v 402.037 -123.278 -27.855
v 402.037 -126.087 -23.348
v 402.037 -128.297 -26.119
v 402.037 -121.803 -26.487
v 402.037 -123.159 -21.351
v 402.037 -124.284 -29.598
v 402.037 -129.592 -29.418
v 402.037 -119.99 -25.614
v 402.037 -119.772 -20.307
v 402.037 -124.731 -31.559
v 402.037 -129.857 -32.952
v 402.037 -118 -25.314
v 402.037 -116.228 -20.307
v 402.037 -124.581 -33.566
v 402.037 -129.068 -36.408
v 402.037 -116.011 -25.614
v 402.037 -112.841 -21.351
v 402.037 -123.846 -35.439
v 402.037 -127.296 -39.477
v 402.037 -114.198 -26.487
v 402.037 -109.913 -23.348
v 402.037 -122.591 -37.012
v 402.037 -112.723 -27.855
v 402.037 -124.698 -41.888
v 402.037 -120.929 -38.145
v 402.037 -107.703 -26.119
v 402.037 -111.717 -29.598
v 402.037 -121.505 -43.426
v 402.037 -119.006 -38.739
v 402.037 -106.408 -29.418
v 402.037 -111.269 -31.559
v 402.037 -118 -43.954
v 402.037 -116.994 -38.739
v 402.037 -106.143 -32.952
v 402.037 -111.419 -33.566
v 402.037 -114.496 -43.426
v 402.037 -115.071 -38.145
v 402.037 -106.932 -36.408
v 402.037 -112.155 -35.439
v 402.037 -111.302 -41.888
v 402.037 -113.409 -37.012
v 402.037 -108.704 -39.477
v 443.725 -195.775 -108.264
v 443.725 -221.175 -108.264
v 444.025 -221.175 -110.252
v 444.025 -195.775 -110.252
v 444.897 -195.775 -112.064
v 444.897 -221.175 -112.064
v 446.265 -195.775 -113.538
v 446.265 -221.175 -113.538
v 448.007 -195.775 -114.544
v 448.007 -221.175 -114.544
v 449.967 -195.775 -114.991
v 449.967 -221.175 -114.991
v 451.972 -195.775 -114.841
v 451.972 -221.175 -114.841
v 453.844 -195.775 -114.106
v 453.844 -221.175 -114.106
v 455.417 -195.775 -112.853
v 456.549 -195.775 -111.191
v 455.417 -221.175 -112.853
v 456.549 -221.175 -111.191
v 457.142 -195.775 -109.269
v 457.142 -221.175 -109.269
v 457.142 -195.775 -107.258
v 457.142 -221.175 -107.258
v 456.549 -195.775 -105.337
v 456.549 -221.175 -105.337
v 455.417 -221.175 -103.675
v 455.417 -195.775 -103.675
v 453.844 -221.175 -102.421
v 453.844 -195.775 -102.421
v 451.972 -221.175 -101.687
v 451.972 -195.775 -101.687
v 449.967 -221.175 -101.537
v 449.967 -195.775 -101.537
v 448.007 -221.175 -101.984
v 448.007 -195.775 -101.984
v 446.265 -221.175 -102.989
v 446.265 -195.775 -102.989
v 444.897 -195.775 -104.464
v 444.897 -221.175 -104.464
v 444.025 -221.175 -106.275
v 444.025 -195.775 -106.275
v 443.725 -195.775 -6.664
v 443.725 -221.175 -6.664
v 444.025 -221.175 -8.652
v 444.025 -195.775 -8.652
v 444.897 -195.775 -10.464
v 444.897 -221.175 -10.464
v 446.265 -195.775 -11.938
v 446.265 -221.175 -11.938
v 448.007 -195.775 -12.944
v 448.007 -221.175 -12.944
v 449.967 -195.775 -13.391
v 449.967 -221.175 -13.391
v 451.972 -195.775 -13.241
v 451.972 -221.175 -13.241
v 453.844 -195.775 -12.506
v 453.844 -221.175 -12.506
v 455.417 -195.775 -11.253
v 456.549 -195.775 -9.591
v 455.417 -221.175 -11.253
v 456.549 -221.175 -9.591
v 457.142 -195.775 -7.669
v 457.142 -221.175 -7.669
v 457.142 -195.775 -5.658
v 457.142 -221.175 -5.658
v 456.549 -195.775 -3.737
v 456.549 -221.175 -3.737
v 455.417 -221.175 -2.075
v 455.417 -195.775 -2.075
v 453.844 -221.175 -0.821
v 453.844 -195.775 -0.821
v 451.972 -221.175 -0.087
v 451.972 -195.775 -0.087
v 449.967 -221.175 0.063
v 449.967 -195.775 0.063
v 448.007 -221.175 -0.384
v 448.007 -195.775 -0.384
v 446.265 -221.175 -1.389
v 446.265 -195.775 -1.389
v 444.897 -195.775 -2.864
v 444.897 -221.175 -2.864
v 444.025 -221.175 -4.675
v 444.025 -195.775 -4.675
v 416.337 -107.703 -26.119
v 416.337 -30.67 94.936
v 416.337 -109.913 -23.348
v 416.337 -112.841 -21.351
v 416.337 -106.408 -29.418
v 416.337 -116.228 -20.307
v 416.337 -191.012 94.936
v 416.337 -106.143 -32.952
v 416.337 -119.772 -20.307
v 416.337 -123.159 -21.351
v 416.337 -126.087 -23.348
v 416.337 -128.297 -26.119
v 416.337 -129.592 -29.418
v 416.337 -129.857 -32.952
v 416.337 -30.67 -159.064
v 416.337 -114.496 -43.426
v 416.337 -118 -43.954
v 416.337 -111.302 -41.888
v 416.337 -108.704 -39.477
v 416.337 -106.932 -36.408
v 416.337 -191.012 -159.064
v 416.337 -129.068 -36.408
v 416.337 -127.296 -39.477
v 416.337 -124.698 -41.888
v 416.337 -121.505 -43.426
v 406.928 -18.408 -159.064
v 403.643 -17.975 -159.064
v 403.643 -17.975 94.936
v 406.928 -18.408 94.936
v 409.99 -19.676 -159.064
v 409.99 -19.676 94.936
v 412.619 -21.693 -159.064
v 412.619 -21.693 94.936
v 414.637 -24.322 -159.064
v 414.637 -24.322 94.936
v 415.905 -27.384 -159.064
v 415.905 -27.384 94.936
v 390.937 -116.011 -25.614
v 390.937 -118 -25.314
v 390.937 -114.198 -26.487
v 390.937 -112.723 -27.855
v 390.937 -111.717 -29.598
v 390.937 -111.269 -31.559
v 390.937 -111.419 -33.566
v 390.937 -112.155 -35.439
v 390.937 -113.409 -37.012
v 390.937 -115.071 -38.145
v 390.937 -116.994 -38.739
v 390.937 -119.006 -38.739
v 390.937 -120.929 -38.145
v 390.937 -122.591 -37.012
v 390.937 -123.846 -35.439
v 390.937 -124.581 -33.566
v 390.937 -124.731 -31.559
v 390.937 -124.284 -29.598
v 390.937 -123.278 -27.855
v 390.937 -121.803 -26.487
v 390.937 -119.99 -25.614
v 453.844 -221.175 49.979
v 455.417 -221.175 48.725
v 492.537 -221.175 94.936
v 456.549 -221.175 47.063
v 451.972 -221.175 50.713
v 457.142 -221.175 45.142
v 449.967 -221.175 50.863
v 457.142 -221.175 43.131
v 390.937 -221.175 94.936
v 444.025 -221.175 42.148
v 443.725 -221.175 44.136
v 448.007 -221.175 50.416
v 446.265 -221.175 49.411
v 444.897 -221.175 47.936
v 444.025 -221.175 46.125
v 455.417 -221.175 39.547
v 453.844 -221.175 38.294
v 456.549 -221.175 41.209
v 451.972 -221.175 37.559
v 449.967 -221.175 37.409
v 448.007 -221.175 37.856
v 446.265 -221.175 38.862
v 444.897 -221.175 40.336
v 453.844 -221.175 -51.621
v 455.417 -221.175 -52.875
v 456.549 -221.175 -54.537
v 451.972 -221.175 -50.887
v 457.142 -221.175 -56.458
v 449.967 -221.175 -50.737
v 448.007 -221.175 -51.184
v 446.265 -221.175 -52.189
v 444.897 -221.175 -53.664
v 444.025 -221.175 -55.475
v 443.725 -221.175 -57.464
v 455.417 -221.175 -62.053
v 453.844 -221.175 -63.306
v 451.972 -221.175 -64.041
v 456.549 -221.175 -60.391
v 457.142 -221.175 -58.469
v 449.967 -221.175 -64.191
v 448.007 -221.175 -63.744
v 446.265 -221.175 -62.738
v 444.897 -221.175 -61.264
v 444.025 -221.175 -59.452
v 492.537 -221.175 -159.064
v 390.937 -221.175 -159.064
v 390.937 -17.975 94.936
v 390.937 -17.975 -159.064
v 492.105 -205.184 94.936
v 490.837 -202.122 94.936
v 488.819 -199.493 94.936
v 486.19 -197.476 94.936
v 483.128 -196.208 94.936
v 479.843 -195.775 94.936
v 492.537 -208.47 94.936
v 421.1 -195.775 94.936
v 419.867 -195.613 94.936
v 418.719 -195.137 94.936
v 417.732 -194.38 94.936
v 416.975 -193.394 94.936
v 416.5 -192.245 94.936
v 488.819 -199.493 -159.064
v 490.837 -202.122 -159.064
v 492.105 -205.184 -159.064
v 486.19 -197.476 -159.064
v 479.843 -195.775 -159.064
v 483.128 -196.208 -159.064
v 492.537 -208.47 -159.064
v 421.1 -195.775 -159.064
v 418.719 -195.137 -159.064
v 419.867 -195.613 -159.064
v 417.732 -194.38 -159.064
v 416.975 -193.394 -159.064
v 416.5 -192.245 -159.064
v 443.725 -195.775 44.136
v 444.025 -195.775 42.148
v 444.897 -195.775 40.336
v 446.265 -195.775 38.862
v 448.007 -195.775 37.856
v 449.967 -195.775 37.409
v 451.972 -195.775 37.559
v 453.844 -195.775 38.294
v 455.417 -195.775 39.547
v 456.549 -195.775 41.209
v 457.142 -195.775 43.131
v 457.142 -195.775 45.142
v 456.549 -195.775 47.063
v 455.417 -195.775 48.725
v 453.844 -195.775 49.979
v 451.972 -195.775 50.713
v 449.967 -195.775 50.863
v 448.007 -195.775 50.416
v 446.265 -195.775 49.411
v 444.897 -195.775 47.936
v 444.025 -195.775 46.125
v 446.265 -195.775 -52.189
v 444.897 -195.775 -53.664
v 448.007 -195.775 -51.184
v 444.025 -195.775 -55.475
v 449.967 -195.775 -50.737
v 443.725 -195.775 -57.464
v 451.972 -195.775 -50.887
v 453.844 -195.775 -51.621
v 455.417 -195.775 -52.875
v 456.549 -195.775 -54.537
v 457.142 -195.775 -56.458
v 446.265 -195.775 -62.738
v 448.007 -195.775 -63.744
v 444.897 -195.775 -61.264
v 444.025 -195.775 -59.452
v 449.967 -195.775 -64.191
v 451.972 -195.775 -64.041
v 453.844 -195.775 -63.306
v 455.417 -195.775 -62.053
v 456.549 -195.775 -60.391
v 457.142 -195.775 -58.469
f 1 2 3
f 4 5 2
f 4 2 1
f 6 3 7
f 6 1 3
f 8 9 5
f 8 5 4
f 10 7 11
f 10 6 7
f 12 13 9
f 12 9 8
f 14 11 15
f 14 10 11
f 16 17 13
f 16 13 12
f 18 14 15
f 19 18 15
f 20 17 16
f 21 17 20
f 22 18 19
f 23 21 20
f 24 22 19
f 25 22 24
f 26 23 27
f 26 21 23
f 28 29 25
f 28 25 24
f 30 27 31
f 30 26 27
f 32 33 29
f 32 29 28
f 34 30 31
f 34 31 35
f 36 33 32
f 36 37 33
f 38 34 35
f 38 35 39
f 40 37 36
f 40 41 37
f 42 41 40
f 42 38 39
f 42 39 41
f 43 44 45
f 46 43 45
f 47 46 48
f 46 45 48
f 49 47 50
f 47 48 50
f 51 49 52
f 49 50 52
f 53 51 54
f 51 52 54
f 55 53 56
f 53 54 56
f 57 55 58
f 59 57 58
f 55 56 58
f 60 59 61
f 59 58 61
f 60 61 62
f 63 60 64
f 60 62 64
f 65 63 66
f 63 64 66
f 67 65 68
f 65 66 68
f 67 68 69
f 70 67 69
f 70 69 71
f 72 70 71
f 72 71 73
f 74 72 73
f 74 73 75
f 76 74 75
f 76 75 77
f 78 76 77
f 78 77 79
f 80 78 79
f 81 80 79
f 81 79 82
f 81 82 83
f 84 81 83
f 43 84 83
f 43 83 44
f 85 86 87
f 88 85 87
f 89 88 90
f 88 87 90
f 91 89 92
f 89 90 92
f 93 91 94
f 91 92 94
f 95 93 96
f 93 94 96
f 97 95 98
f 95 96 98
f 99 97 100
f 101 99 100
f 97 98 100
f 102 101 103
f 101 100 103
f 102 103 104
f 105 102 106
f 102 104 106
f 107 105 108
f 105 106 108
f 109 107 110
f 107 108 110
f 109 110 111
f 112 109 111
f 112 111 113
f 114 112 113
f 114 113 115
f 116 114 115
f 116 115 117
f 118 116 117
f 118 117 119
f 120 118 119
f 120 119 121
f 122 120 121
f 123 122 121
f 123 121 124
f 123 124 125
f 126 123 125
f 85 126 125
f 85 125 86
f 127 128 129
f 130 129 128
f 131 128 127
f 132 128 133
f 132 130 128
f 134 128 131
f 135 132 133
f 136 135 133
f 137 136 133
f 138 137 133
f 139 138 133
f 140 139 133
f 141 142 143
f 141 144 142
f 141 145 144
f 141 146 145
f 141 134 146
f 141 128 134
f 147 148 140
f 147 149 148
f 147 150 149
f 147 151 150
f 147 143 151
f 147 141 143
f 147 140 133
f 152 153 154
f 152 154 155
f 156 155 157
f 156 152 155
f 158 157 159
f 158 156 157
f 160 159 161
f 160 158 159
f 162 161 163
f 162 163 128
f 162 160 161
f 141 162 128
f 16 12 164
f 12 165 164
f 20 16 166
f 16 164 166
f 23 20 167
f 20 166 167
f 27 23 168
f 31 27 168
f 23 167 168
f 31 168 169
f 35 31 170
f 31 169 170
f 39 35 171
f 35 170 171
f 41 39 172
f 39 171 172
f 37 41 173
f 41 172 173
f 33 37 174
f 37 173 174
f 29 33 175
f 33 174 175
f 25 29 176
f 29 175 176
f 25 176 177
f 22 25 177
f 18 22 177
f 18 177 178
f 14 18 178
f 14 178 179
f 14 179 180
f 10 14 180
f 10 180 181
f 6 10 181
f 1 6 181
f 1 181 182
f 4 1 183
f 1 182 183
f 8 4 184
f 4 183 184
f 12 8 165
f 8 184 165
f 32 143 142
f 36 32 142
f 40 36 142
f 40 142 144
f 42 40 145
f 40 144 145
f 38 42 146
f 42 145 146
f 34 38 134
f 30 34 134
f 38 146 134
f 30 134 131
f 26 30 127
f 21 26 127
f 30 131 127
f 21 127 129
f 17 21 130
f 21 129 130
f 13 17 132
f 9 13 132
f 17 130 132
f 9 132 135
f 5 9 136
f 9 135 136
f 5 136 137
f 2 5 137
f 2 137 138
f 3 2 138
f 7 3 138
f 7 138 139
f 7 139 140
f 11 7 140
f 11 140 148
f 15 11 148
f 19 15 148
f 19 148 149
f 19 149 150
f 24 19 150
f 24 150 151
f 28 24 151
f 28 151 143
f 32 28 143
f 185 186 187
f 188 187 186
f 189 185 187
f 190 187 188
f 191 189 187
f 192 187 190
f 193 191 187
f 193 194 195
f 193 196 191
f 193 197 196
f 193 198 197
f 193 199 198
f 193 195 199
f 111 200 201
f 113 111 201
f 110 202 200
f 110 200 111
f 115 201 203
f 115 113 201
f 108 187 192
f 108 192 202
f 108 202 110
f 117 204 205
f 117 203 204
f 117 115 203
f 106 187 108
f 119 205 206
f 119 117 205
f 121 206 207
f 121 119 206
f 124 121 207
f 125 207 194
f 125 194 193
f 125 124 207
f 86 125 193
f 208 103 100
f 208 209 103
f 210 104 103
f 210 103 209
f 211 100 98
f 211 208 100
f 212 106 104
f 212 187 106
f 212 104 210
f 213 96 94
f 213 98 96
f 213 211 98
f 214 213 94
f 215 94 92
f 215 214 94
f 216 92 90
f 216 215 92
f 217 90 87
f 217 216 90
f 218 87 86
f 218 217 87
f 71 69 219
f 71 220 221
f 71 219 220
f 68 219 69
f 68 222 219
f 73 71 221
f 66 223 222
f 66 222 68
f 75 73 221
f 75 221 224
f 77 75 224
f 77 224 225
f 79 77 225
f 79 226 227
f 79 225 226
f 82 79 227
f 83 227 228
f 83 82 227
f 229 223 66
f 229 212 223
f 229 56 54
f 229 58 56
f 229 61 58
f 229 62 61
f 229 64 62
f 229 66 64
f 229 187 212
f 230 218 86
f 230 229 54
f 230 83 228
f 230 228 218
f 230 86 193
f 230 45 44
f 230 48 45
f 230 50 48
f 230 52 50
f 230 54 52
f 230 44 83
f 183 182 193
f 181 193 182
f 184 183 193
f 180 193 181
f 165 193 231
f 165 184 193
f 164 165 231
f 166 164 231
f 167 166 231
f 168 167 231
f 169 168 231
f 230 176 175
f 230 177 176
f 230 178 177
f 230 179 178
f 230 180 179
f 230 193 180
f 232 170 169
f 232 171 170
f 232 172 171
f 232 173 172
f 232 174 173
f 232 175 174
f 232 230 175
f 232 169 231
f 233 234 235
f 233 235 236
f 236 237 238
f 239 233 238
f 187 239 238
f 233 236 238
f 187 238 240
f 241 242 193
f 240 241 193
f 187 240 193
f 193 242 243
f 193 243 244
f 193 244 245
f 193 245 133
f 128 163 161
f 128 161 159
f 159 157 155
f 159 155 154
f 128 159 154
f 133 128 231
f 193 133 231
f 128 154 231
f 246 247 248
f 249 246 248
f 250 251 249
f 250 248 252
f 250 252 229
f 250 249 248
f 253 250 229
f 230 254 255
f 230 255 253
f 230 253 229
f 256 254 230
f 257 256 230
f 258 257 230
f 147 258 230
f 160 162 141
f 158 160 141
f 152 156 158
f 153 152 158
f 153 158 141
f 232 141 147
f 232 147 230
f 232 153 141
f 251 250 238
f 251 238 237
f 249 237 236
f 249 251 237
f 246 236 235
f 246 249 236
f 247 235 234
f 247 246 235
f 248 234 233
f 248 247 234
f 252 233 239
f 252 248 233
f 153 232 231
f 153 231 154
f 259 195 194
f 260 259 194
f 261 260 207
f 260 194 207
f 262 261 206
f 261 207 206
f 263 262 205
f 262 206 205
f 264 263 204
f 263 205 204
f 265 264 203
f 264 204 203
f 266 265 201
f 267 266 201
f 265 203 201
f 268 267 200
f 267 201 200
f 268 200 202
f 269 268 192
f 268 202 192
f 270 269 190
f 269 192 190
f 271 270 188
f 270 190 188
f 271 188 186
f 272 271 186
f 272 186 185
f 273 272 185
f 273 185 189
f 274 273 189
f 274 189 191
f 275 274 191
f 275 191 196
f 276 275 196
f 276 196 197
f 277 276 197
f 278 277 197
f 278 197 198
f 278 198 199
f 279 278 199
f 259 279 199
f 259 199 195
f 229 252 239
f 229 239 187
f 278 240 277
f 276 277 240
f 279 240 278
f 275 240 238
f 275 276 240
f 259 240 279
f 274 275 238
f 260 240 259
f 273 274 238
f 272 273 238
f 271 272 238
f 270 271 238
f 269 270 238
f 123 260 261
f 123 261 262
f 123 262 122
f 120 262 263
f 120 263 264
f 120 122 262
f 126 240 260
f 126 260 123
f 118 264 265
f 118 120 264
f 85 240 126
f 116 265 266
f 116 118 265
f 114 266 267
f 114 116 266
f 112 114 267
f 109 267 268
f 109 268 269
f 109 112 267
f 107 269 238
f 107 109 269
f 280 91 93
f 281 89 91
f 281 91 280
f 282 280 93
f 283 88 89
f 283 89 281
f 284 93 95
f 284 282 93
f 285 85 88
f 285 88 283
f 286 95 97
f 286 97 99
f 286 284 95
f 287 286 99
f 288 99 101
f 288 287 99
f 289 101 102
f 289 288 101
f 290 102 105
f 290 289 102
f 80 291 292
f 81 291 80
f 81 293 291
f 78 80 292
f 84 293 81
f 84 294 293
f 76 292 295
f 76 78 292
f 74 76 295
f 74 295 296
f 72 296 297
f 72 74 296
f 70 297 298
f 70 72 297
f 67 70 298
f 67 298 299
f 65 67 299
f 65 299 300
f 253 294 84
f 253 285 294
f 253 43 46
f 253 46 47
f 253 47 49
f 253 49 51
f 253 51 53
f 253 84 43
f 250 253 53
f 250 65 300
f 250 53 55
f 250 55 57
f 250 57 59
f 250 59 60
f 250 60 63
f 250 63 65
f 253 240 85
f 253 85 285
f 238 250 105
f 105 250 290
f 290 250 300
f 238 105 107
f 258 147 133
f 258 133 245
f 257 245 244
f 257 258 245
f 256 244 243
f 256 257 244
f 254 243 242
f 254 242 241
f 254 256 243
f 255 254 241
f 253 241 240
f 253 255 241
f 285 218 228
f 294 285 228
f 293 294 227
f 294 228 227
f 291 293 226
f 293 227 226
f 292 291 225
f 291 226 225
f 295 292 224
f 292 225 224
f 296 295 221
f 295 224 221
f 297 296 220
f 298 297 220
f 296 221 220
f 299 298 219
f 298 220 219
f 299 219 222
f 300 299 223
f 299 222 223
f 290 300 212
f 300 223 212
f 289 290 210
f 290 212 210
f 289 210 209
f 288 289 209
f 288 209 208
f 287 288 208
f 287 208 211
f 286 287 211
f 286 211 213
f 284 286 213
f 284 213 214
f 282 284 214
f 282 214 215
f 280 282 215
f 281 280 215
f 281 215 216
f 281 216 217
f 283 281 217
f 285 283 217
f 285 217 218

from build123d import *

# Parameters (mm, degrees)
L_ANGLE_L8X4X1_1_DEPTH                   = 254
F_1_2_CLEARANCE_HOLE1_D                  = 13.49248
CBORE_FOR_M12_HEX_HEAD_BOLT1_D           = 13.5
CBORE_FOR_M12_HEX_HEAD_BOLT1_CBORE_D     = 23.78
CBORE_FOR_M12_HEX_HEAD_BOLT1_CBORE_DEPTH = 14.3


with BuildPart() as part:
    # Sketch114 → L angle L8X4X1(1) (new body)
    with BuildSketch(Plane(origin=(390.937425431, -221.174980879, -159.063896304), x_dir=(1, 0, 0), z_dir=(0, 0, 1))):
        with BuildLine():
            Line((0, 0), (0, 203.2))
            Line((0, 203.2), (12.70508, 203.2))
            ThreePointArc((12.70508, 203.2), (21.681744019, 199.481744019), (25.4, 190.50508))
            Line((25.4, 190.50508), (25.4, 30.1625))
            ThreePointArc((25.4, 30.1625), (26.794903955, 26.794903955), (30.1625, 25.4))
            Line((30.1625, 25.4), (88.90508, 25.4))
            ThreePointArc((88.90508, 25.4), (97.881744019, 21.681744019), (101.6, 12.70508))
            Line((101.6, 12.70508), (101.6, 0))
            Line((101.6, 0), (0, 0))
        make_face()
    extrude(amount=L_ANGLE_L8X4X1_1_DEPTH)

    # 1/2 Clearance Hole1 (through all)
    with Locations(Plane(origin=(0, -195.774980879, 0), x_dir=(1, 0, 0), z_dir=(0, 1, 0))):
        with Locations((450.471215431, -44.136103696), (450.471215431, 108.263896304), (450.471215431, 57.463896304), (450.471215431, 6.663896304)):
            Hole(F_1_2_CLEARANCE_HOLE1_D / 2)

    # CBORE for M12 Hex Head Bolt1 (through all)
    with Locations(Plane(origin=(416.337425431, 0, 0), x_dir=(0, 0, -1), z_dir=(1, 0, 0))):
        with Locations((32.063896304, -118.000180879)):
            CounterBoreHole(CBORE_FOR_M12_HEX_HEAD_BOLT1_D / 2, CBORE_FOR_M12_HEX_HEAD_BOLT1_CBORE_D / 2, CBORE_FOR_M12_HEX_HEAD_BOLT1_CBORE_DEPTH)


solid = part.part
